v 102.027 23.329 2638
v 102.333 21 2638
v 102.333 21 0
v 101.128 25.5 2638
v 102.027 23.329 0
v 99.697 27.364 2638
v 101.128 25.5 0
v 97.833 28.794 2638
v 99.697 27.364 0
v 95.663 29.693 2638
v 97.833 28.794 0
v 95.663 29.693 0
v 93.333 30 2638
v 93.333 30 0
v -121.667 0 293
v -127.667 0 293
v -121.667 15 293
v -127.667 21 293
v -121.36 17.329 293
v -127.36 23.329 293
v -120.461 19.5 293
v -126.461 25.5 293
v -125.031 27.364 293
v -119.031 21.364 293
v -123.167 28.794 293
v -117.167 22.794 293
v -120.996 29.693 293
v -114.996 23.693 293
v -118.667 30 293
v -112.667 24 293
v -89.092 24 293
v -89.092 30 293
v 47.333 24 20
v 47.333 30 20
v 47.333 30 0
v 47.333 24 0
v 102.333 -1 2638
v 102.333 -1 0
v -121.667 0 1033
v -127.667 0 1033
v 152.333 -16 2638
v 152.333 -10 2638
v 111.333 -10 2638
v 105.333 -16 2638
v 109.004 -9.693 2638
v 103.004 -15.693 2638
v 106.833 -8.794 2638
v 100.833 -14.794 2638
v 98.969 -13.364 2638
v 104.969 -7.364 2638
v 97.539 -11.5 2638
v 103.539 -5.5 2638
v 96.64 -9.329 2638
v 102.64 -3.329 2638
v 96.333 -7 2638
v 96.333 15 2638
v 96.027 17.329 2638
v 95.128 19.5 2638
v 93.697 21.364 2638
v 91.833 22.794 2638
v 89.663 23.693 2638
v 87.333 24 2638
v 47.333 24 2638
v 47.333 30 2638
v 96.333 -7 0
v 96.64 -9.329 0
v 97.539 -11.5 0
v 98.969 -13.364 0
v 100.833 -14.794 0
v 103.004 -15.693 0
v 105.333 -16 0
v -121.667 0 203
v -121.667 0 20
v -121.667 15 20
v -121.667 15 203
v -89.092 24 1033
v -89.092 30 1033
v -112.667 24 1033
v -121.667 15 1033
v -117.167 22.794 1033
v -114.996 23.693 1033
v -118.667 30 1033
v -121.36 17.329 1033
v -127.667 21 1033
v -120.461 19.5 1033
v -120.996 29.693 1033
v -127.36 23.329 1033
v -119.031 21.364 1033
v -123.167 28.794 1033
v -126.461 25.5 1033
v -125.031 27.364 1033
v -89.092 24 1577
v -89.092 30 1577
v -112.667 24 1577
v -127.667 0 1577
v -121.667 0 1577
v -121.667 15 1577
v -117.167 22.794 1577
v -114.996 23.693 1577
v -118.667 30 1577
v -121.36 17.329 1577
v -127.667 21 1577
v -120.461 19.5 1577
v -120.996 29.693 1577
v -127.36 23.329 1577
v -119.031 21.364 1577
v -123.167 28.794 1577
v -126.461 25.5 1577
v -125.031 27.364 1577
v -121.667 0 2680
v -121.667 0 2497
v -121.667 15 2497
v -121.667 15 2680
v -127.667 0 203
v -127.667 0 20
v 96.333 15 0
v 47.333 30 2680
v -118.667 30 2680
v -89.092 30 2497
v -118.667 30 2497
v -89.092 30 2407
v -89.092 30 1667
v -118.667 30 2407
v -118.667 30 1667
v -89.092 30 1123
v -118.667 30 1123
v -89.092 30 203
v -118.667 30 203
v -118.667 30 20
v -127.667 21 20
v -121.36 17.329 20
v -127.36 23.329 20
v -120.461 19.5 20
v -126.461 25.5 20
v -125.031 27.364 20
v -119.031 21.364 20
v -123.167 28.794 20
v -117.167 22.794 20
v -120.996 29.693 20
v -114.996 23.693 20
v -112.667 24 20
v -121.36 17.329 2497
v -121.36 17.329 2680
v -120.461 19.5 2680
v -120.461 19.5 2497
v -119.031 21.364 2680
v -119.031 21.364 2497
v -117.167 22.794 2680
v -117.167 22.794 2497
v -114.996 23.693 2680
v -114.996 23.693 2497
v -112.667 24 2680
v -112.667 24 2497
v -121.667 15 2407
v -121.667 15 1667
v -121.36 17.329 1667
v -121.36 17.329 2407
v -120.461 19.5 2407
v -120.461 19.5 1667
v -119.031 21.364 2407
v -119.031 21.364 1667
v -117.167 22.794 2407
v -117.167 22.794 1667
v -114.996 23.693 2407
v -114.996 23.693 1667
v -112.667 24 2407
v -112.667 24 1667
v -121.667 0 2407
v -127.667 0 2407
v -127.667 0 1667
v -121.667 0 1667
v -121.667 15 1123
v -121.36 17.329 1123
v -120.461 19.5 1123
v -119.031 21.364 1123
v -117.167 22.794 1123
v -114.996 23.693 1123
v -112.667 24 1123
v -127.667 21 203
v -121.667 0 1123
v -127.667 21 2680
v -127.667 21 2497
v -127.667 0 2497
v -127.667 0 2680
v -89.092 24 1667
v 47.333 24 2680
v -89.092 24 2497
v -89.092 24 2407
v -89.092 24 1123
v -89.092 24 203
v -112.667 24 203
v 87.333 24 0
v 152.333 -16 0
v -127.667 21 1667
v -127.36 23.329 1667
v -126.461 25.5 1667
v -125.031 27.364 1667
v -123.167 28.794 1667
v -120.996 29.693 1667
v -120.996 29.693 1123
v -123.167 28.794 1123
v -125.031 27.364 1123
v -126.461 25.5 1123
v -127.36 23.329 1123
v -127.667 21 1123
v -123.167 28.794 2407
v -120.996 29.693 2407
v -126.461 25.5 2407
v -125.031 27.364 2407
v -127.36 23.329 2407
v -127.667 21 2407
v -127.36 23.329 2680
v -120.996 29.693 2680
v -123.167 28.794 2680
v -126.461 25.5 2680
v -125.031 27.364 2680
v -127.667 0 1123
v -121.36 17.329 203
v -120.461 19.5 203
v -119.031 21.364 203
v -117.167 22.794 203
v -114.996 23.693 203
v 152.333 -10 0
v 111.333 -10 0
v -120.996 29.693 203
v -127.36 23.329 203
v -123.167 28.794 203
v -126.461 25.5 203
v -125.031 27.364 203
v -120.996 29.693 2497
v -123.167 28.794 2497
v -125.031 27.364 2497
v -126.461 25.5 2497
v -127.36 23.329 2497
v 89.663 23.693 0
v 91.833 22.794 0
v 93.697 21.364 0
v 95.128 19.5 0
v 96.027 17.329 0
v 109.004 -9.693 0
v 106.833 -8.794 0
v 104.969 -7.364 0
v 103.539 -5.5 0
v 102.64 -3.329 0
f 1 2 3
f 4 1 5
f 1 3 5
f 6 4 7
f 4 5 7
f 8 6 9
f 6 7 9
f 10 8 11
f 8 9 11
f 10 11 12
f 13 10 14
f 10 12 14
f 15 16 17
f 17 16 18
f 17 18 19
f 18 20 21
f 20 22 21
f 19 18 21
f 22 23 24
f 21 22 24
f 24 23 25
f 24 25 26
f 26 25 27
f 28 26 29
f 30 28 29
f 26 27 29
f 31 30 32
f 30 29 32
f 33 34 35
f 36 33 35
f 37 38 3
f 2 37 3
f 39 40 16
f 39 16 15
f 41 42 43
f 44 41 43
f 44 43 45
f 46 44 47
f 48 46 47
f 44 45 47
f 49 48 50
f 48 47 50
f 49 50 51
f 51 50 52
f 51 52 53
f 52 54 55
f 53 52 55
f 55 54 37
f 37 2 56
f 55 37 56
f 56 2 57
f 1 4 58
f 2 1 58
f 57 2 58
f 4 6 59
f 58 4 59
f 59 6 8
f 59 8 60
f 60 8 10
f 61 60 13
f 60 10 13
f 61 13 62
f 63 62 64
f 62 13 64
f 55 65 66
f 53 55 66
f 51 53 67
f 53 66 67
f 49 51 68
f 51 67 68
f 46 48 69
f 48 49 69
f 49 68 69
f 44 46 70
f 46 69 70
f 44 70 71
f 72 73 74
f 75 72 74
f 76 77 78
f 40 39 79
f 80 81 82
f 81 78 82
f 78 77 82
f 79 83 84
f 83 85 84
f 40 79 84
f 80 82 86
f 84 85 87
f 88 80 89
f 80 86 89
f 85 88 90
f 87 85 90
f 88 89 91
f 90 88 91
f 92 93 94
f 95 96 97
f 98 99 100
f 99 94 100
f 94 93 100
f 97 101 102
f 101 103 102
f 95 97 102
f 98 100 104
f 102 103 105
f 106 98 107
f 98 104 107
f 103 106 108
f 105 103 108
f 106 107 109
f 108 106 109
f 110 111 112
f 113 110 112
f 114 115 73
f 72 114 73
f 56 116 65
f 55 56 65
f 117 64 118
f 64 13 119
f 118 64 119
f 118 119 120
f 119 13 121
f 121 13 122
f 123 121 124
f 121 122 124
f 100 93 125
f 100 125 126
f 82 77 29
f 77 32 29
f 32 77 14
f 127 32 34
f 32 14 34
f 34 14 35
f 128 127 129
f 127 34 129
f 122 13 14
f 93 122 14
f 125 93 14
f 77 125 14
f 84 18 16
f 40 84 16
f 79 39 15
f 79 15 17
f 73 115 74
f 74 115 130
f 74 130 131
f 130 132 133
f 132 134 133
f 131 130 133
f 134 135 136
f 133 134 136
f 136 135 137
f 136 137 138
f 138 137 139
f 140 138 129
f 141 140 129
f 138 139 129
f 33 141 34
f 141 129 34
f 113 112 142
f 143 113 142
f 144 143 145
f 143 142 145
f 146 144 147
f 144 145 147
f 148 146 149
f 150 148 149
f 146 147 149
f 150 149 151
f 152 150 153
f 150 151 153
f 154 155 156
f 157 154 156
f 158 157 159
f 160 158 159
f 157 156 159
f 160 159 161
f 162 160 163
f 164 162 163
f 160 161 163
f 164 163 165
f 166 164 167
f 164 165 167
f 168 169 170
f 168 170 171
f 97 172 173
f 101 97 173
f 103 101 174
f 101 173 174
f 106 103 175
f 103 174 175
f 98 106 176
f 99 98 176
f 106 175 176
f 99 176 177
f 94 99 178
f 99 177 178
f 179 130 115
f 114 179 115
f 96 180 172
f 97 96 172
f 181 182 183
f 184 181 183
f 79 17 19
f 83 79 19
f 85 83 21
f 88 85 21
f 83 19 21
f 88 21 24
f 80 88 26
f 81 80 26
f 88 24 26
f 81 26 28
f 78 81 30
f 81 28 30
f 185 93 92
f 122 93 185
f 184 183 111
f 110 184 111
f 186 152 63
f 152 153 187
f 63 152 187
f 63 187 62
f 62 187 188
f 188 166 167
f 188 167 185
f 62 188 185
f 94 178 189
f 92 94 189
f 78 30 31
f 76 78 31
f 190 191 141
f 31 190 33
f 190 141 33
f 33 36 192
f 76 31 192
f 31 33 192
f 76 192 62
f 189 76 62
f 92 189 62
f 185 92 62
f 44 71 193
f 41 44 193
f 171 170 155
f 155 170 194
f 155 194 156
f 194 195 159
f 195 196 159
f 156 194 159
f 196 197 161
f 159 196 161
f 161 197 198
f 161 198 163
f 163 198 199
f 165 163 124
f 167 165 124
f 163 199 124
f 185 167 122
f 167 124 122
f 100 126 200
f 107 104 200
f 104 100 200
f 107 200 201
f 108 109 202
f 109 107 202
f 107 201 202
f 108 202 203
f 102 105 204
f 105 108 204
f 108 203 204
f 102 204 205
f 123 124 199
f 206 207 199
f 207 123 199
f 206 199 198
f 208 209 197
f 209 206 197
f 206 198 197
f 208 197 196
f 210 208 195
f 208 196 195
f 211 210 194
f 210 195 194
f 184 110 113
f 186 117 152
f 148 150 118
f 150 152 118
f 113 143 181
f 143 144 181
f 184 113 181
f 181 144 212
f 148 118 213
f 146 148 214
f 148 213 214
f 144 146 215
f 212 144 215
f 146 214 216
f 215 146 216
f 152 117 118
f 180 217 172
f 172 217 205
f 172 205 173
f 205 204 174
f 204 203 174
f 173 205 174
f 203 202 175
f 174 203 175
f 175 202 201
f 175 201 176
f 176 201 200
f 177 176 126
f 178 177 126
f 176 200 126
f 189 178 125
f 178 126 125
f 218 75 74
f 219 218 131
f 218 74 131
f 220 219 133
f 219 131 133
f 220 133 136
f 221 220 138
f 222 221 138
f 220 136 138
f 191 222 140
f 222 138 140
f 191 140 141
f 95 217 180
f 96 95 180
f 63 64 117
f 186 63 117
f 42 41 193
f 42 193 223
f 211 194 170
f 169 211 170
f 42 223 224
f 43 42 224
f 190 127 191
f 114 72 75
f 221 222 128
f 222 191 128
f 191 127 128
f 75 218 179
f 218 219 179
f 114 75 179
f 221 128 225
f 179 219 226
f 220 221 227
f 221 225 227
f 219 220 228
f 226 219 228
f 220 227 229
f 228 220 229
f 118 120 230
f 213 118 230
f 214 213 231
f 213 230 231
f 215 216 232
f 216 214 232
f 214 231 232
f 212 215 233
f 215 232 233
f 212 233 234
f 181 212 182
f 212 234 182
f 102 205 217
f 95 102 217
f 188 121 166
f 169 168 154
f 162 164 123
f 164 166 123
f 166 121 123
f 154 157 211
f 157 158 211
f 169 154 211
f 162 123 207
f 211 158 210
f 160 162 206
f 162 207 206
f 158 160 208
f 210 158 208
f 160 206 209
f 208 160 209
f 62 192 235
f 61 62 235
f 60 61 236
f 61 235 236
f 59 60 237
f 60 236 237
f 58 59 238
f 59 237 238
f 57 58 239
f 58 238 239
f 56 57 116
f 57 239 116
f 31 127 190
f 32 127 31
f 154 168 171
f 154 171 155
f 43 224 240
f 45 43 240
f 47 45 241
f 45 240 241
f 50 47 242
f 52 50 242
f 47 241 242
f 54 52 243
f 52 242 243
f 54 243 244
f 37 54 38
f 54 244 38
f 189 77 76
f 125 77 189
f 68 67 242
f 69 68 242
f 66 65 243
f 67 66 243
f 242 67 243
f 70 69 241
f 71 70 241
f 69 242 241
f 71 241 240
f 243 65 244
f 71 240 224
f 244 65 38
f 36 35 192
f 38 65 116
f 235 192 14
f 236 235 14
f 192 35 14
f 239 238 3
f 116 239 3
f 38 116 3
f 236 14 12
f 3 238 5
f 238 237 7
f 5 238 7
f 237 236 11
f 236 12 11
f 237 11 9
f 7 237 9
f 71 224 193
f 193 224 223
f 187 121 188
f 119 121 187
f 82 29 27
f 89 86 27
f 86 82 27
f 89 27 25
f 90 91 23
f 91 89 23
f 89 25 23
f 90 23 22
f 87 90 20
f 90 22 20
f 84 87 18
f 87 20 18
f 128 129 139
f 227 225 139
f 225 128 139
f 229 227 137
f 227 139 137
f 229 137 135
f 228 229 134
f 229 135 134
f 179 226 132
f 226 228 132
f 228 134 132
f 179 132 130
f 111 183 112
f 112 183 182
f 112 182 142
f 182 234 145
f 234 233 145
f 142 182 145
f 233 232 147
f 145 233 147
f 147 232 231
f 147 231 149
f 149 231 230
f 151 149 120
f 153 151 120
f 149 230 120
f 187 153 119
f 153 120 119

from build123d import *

# Parameters (mm, degrees)
F1_DEPTH = 2700
F2_W     = 175
F2_H     = 20
F3_DEPTH = 46.001
F4_W     = 29.575
F4_H     = 90
F4_W_2   = 9
F5_DEPTH = 46.001
F6_W     = 74
F6_H     = 62
F7_DEPTH = 46.001


with BuildPart() as f1:
    # F0 (on Top) → F1 (new body)
    with BuildSketch(Plane.XY):
        with BuildLine():
            Line((-127.6665818456, 21), (-127.6665818456, 0))
            Line((-127.6665818456, 0), (-121.6665818456, 0))
            Line((-121.6665818456, 0), (-121.6665818456, 15))
            ThreePointArc((-121.6665818456, 15), (-119.0305428763, 21.3639610307), (-112.6665818456, 24))
            Line((-112.6665818456, 24), (-12.6665818456, 24))
            Line((-12.6665818456, 24), (-12.6665818456, 30))
            Line((-12.6665818456, 30), (-118.6665818456, 30))
            ThreePointArc((-118.6665818456, 30), (-125.0305428763, 27.3639610307), (-127.6665818456, 21))
        make_face()
        with BuildLine():
            Line((93.3334181544, 30), (-12.6665818456, 30))
            Line((-12.6665818456, 30), (-12.6665818456, 24))
            Line((-12.6665818456, 24), (87.3334181544, 24))
            ThreePointArc((87.3334181544, 24), (93.697379185, 21.3639610307), (96.3334181544, 15))
            Line((96.3334181544, 15), (96.3334181544, -7))
            ThreePointArc((96.3334181544, -7), (98.9694571237, -13.3639610307), (105.3334181544, -16))
            Line((105.3334181544, -16), (152.3334181544, -16))
            Line((152.3334181544, -16), (152.3334181544, -10))
            Line((152.3334181544, -10), (111.3334181544, -10))
            ThreePointArc((111.3334181544, -10), (104.9694571237, -7.3639610307), (102.3334181544, -1))
            Line((102.3334181544, -1), (102.3334181544, 21))
            ThreePointArc((102.3334181544, 21), (99.697379185, 27.3639610307), (93.3334181544, 30))
        make_face()
    extrude(amount=F1_DEPTH)

    # F2 (on face) → F3 (cut, through all)
    with BuildSketch(Plane(origin=(0, 30, 0), x_dir=(-1, 0, 0), z_dir=(0, 1, 0))):
        with Locations((40.1665818456, 2690)):
            Rectangle(F2_W, F2_H)
        Polygon((-47.3334181544, 0), (118.6665818456, 0), (127.6665818456, 0), (127.6665818456, 20), (-47.3334181544, 20), align=None)
    extrude(amount=-F3_DEPTH, mode=Mode.SUBTRACT)

    # F4 (on face) → F5 (cut, through all)
    with BuildSketch(Plane(origin=(0, 30, 0), x_dir=(-1, 0, 0), z_dir=(0, 1, 0))):
        with Locations((103.8790818456, 2452)):
            Rectangle(F4_W, F4_H)
        with Locations((123.1665818456, 2452)):
            Rectangle(F4_W_2, F4_H)
        with Locations((123.1665818456, 248)):
            Rectangle(F4_W_2, F4_H)
        with Locations((103.8790818456, 248)):
            Rectangle(F4_W, F4_H)
        with Locations((103.8790818456, 1078)):
            Rectangle(F4_W, F4_H)
        with Locations((123.1665818456, 1078)):
            Rectangle(F4_W_2, F4_H)
        with Locations((103.8790818456, 1622)):
            Rectangle(F4_W, F4_H)
        with Locations((123.1665818456, 1622)):
            Rectangle(F4_W_2, F4_H)
    extrude(amount=-F5_DEPTH, mode=Mode.SUBTRACT)

    # F6 (on face) → F7 (cut, through all)
    with BuildSketch(Plane(origin=(0, 30, 0), x_dir=(-1, 0, 0), z_dir=(0, 1, 0))):
        Polygon((-47.3334181544, 2680), (-47.3334181544, 2700), (-93.3334181544, 2700), (-93.3334181544, 2638), (-47.3334181544, 2638), align=None)
        with Locations((-130.3334181544, 2669)):
            Rectangle(F6_W, F6_H)
    extrude(amount=-F7_DEPTH, mode=Mode.SUBTRACT)


solid = f1.part
